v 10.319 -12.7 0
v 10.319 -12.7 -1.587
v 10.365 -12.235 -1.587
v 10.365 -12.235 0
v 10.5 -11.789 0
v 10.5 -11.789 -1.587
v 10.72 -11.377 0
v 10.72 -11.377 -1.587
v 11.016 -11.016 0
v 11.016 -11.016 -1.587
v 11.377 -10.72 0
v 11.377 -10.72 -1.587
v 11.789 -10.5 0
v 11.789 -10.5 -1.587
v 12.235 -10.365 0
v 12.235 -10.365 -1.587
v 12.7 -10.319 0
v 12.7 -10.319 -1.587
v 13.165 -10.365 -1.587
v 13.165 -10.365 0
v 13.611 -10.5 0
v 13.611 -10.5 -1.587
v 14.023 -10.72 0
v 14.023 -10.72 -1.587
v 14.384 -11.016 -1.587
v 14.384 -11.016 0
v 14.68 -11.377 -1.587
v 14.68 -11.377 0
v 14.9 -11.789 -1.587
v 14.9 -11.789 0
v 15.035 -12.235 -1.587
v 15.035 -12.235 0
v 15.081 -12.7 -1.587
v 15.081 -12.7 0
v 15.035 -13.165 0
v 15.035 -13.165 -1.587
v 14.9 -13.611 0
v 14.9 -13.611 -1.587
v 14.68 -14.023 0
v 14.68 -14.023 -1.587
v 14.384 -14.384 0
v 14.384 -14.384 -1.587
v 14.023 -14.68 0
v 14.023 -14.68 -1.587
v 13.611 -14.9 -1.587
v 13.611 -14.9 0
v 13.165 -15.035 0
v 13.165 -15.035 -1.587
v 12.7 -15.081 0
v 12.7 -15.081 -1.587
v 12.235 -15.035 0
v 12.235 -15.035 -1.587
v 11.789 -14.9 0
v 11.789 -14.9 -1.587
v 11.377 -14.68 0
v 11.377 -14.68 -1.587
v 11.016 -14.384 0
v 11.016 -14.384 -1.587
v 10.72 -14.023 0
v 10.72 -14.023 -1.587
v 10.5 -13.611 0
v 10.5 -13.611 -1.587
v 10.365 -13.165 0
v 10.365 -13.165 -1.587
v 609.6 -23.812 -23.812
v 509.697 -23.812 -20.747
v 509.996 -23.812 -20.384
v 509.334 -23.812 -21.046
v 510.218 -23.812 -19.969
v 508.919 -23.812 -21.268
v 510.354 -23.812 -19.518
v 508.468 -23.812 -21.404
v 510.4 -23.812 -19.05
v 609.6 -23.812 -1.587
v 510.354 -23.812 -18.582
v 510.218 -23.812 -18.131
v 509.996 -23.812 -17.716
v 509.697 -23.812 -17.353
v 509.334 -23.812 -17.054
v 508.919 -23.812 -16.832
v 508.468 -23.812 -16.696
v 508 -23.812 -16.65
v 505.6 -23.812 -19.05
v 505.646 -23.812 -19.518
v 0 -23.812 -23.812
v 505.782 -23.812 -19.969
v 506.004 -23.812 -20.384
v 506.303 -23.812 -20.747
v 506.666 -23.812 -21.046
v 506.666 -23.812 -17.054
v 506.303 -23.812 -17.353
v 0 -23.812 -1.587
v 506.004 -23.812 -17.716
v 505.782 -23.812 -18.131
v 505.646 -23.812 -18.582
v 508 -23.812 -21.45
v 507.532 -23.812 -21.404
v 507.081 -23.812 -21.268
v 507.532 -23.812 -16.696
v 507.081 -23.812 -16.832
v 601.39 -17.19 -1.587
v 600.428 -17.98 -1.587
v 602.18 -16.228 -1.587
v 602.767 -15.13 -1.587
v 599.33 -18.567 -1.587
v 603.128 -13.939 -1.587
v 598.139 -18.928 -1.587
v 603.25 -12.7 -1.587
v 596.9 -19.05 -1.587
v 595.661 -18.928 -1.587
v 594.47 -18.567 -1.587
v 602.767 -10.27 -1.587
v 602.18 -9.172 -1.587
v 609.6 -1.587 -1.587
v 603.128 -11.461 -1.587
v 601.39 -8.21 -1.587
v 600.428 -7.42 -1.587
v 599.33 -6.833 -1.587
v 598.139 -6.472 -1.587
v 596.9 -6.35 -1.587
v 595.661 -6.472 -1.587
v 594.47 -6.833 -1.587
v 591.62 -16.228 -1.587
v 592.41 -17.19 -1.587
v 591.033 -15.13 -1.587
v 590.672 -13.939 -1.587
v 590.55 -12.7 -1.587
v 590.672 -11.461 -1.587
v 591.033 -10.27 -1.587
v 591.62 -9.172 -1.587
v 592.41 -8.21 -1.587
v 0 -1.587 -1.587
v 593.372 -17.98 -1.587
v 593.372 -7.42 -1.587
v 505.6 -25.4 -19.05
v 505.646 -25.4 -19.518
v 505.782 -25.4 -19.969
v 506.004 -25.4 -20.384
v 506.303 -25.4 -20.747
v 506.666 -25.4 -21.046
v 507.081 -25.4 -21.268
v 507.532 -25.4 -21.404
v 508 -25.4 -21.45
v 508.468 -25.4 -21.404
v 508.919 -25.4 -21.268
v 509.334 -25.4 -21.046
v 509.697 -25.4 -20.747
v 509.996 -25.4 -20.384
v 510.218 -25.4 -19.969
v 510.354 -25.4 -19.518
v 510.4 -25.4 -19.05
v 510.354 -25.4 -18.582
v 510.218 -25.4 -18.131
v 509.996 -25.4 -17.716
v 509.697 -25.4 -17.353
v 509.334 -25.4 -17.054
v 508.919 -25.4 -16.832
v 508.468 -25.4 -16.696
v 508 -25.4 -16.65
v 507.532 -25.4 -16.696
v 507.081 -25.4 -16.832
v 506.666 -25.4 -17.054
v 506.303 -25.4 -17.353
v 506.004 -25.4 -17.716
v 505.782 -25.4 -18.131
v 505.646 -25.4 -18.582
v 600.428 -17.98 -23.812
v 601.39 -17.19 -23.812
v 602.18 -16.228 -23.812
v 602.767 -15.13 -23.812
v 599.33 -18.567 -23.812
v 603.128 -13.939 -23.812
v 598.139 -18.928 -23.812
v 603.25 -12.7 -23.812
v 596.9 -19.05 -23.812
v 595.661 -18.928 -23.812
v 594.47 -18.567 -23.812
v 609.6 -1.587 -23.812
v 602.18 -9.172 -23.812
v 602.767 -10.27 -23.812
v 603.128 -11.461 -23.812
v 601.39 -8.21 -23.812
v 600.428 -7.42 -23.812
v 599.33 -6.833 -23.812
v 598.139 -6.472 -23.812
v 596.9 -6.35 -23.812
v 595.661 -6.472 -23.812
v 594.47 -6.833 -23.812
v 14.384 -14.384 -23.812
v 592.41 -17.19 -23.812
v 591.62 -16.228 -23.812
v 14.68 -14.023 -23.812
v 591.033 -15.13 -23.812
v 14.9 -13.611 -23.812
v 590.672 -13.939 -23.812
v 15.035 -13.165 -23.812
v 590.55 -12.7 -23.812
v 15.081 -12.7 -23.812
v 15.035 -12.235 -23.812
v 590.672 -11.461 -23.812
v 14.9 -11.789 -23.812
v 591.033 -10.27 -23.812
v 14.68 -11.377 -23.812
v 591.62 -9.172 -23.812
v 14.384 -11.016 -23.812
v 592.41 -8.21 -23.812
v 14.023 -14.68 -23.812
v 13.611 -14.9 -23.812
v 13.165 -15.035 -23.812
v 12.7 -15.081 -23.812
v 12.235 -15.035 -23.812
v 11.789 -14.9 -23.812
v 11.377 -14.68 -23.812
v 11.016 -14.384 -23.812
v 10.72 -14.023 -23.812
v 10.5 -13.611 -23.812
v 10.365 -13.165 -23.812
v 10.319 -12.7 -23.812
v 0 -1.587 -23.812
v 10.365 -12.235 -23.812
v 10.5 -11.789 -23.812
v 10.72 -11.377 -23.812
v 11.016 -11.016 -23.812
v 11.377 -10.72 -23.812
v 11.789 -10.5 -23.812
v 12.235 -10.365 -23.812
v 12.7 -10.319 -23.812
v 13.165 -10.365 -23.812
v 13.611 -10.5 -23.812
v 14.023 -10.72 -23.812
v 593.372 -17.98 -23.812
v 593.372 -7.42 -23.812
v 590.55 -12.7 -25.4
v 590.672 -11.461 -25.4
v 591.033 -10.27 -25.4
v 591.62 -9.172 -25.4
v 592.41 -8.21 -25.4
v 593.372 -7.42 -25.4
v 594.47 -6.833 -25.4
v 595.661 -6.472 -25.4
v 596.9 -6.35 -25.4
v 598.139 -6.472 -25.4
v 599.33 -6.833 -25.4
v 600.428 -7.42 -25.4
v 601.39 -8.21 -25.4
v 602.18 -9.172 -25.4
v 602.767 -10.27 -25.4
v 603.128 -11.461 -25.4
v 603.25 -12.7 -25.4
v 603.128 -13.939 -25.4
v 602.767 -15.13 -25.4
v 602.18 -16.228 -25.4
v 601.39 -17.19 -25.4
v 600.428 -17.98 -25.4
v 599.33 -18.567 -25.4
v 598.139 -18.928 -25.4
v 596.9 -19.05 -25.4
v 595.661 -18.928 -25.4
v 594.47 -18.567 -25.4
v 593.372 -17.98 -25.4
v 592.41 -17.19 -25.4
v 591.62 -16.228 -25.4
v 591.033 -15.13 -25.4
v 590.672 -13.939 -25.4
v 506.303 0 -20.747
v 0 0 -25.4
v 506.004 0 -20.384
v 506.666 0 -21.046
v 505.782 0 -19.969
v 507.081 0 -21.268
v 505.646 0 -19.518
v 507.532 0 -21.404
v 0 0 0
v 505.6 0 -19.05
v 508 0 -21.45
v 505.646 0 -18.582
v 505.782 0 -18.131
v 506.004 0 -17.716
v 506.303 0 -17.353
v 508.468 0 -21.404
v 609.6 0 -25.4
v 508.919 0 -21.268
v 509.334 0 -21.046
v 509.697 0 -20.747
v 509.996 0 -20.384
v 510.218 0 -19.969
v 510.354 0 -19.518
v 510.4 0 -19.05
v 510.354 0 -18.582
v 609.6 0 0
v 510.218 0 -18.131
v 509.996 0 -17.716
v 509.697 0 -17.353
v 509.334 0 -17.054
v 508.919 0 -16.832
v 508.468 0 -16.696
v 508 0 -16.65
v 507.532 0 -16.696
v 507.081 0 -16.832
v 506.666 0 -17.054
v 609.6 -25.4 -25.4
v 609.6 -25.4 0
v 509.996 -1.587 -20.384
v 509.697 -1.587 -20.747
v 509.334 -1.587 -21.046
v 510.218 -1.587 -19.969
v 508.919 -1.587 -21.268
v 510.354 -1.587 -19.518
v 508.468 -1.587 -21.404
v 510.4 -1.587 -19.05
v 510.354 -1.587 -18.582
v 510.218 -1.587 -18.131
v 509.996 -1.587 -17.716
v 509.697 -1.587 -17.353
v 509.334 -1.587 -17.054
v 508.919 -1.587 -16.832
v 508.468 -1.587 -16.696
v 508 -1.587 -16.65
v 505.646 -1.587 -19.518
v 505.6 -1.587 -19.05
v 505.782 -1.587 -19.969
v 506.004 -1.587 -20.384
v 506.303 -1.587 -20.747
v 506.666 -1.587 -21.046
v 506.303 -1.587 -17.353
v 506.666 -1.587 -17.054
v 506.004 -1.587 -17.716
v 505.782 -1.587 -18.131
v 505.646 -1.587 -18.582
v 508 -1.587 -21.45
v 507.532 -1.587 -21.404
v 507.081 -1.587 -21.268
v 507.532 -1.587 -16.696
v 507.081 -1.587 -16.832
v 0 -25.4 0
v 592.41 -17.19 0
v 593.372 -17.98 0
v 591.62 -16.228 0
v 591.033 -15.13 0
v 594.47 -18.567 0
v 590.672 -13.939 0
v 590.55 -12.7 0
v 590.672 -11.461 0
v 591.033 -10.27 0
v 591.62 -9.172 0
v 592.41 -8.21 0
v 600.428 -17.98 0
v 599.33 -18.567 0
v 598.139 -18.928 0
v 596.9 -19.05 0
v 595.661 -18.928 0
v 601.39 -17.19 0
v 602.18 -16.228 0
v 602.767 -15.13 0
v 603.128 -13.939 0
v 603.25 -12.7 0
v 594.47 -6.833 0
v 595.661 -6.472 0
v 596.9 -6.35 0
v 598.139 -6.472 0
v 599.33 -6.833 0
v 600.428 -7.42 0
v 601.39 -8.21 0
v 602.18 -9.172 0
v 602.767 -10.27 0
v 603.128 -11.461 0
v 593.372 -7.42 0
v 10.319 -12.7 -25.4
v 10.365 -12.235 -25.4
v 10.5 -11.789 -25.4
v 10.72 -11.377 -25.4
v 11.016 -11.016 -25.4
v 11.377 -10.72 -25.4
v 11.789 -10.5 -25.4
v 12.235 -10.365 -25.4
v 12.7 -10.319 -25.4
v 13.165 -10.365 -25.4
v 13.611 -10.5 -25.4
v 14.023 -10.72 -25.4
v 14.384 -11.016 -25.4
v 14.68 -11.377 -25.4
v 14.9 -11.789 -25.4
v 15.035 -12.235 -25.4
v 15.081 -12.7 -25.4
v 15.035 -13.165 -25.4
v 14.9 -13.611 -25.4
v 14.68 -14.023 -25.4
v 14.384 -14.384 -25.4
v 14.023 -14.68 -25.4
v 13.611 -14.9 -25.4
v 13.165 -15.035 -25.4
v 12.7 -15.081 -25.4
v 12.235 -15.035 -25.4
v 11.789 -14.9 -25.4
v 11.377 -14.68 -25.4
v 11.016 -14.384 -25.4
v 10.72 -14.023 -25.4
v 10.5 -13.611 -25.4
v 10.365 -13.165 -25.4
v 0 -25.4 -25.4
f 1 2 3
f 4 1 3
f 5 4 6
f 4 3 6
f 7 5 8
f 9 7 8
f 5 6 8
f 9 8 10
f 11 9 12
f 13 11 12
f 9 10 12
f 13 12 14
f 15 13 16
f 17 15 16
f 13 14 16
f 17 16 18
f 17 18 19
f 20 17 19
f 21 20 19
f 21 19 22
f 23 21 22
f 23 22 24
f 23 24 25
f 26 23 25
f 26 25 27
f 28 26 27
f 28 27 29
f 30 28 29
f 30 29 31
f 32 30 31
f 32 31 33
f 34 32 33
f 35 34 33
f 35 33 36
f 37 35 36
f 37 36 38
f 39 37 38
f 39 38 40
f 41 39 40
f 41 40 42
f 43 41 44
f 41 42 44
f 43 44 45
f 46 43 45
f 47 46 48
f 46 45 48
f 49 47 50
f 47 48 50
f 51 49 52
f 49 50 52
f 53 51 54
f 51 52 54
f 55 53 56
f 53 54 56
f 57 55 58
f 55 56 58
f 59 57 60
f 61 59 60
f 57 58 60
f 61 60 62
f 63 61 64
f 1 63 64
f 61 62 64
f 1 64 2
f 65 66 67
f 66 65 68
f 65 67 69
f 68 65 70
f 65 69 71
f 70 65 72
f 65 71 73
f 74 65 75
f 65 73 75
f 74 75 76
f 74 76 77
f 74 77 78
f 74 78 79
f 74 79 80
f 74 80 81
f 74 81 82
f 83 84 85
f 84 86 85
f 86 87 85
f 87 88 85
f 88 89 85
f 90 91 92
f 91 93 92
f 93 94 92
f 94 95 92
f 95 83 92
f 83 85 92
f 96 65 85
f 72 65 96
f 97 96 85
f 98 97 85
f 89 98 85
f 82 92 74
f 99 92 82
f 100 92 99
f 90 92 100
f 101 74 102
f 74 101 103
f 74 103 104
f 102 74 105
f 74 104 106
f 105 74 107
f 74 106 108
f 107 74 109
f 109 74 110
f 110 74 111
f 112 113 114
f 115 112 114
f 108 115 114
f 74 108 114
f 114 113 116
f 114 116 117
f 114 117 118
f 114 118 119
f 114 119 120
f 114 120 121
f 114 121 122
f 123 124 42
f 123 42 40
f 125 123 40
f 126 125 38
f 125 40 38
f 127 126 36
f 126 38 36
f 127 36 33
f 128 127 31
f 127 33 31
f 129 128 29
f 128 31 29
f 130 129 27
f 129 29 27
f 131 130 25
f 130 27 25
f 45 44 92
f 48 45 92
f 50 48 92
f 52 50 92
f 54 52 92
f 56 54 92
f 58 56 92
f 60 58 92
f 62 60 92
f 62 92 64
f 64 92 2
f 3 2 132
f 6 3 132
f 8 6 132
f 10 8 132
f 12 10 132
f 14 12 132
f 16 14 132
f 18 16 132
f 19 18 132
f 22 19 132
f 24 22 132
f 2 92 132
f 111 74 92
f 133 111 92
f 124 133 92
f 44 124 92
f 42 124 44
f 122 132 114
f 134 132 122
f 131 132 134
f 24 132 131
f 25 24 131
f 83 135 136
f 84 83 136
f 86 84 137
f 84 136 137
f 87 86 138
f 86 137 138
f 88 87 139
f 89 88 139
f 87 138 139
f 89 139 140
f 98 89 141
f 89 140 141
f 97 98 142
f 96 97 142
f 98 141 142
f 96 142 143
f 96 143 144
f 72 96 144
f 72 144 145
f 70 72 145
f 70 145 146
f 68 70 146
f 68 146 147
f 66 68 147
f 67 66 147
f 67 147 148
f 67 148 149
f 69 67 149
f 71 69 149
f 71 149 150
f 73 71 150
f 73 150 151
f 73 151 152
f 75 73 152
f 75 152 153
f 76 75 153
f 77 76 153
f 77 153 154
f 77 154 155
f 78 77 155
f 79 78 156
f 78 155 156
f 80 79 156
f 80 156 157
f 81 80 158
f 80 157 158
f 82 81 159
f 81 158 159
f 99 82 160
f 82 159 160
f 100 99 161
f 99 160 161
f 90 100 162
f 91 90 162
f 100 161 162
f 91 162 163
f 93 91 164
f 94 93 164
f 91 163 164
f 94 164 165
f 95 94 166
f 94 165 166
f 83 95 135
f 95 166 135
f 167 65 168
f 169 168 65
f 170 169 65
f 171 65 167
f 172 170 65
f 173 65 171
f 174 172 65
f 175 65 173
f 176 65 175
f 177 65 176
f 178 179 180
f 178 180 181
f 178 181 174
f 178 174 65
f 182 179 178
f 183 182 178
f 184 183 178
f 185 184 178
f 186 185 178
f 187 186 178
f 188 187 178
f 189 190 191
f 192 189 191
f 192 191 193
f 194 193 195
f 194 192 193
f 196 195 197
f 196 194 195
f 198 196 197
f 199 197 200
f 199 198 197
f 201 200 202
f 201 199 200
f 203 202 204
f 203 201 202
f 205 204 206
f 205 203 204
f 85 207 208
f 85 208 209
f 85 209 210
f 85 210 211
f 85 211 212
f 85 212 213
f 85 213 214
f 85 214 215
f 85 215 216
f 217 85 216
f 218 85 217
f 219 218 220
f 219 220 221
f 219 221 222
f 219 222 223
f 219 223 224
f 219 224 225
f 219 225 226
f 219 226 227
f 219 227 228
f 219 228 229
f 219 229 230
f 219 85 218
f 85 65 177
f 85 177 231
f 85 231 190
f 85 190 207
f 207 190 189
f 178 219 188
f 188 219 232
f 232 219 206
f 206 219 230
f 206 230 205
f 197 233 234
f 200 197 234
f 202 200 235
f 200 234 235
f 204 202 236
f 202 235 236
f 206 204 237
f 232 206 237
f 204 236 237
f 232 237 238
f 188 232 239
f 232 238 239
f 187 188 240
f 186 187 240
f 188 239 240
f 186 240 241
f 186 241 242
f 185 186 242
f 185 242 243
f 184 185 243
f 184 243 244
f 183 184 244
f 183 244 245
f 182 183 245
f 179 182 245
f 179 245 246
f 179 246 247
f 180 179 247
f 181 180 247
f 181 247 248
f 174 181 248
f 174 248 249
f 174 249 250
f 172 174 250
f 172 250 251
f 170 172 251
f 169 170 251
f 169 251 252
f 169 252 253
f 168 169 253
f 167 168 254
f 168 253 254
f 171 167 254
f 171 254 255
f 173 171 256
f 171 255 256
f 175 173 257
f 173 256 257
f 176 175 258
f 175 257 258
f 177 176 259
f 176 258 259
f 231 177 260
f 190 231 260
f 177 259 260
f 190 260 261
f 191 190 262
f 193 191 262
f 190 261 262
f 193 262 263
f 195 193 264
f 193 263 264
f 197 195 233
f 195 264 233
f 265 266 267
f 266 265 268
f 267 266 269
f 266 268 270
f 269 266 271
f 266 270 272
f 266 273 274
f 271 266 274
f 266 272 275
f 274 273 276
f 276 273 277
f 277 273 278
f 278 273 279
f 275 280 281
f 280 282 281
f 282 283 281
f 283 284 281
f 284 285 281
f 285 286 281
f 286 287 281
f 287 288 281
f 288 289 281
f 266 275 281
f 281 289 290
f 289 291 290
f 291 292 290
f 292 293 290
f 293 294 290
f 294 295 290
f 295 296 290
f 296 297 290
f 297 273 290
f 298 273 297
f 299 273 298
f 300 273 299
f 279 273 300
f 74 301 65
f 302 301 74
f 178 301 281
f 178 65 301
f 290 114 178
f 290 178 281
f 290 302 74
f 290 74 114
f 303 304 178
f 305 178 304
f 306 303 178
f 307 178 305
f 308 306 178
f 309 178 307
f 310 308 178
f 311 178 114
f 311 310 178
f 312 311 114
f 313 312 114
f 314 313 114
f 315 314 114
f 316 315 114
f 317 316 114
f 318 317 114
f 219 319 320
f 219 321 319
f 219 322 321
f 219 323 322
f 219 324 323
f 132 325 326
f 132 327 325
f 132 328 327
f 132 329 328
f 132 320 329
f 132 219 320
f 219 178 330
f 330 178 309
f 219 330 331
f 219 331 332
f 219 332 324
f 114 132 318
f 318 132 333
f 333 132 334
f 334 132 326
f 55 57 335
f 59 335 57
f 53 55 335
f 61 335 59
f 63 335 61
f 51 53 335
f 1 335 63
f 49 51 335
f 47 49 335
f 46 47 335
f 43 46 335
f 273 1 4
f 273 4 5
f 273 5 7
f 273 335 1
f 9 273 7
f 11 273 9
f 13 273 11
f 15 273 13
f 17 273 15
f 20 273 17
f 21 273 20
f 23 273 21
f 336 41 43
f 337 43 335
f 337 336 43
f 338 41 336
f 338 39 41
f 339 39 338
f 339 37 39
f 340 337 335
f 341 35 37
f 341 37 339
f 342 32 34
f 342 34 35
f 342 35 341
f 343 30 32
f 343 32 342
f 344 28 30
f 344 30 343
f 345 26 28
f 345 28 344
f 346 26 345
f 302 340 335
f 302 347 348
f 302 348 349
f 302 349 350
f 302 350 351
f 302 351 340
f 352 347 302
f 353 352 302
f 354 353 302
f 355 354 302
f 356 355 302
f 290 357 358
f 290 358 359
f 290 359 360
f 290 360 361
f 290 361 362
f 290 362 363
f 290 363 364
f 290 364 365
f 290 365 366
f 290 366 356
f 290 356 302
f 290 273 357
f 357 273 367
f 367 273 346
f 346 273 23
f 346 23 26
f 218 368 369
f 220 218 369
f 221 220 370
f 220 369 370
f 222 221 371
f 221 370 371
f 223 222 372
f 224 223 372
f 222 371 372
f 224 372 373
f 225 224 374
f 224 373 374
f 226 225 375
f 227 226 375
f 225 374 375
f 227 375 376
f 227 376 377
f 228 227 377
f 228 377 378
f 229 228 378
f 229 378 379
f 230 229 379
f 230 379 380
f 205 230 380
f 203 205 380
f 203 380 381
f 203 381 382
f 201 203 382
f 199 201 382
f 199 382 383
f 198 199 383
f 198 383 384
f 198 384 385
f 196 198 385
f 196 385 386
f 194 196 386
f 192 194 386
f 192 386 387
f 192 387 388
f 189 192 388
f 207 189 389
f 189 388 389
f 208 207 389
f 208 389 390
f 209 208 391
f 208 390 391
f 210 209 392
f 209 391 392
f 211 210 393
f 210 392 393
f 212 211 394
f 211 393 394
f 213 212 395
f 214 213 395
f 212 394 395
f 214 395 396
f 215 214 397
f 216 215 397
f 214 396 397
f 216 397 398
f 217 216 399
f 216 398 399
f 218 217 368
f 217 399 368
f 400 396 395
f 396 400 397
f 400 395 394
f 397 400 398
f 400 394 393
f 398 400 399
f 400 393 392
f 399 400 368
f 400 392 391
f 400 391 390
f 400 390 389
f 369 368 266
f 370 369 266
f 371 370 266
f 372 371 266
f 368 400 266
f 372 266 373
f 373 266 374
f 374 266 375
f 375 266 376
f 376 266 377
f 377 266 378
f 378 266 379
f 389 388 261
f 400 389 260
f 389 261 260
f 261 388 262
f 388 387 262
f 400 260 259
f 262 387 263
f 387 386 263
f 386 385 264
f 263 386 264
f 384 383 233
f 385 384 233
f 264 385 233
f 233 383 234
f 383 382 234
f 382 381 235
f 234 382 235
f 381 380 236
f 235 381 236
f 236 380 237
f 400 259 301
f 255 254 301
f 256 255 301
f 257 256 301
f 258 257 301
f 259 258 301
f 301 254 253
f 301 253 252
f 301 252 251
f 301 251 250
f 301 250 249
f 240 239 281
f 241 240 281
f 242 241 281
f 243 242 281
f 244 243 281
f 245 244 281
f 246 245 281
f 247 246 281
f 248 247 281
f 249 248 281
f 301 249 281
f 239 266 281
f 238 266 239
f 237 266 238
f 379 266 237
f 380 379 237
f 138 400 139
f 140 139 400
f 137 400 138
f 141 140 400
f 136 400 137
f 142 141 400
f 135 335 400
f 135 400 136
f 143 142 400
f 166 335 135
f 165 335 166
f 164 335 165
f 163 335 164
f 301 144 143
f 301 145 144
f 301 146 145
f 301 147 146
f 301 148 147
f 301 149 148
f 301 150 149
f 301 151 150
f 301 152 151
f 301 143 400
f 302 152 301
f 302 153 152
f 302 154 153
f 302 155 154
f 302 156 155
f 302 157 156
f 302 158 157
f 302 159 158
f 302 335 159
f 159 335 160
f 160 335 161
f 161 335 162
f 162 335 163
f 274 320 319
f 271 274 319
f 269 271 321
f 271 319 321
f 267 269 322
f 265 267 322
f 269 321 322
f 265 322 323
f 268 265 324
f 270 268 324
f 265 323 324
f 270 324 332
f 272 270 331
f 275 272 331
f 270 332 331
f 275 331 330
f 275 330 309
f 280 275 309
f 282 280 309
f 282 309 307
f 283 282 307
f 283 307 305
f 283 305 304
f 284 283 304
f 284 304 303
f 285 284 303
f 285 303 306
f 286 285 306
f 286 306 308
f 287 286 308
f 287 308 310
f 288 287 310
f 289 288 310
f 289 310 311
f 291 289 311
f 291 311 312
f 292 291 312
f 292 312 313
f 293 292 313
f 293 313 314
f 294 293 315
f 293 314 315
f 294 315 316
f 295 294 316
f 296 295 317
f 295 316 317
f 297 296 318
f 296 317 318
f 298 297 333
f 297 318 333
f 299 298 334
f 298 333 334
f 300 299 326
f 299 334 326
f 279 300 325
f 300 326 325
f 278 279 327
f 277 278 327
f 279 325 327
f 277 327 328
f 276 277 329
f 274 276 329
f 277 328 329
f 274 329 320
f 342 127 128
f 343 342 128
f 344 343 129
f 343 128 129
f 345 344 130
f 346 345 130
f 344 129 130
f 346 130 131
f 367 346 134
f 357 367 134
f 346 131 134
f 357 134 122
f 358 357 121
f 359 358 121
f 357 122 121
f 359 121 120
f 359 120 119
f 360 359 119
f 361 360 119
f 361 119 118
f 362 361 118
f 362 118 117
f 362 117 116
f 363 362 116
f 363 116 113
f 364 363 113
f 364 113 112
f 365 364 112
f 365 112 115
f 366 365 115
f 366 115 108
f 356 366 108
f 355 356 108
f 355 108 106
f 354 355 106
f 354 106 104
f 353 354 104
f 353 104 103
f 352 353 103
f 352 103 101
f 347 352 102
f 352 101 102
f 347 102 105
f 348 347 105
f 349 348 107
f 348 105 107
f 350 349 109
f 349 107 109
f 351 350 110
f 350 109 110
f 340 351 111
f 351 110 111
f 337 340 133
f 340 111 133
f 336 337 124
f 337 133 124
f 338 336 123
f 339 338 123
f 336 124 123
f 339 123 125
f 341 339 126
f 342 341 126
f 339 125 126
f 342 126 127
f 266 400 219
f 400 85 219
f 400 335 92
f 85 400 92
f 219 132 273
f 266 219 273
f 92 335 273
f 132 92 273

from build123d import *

# Parameters (mm, degrees)
SKETCH1_W                = 609.6
SKETCH1_H                = 25.4
BOSS_EXTRUDE1_DEPTH      = 25.4
SKETCH2_W                = 22.225
SKETCH2_H                = 22.225
CUT_EXTRUDE1_DEPTH       = 611.657416233
HOLE1_D                  = 4.8006
HOLE1_DEPTH              = 1.5875
M4_CLEARANCE_HOLE1_D     = 4.7625
M4_CLEARANCE_HOLE1_DEPTH = 1.5875
HOLE2_D                  = 12.7
HOLE2_DEPTH              = 1.5875
M4_CLEARANCE_HOLE2_D     = 4.7625
M4_CLEARANCE_HOLE2_DEPTH = 25.4
HOLE3_D                  = 12.7
HOLE3_DEPTH              = 25.4
HOLE4_D                  = 4.8006
HOLE4_DEPTH              = 25.4


with BuildPart() as part:
    # Sketch1 → Boss-Extrude1 (new body)
    with BuildSketch(Plane.XY):
        with Locations((304.8, -12.7)):
            Rectangle(SKETCH1_W, SKETCH1_H)
    extrude(amount=-BOSS_EXTRUDE1_DEPTH)

    # Sketch2 → Cut-Extrude1 (cut, through all)
    with BuildSketch(Plane.ZY):
        with Locations((-12.7, -12.7)):
            Rectangle(SKETCH2_W, SKETCH2_H)
    extrude(amount=-CUT_EXTRUDE1_DEPTH, mode=Mode.SUBTRACT)

    # Hole1
    with Locations(Plane(origin=(0, -23.8125, 0), x_dir=(1, 0, 0), z_dir=(0, 1, 0))):
        with Locations((508, 19.05)):
            Hole(HOLE1_D / 2, depth=HOLE1_DEPTH)

    # M4 Clearance Hole1
    with Locations(Plane.XY.offset(-23.8125)):
        with Locations((12.7, -12.7)):
            Hole(M4_CLEARANCE_HOLE1_D / 2, depth=M4_CLEARANCE_HOLE1_DEPTH)

    # Hole2
    with Locations(Plane.XY.offset(-23.8125)):
        with Locations((596.9, -12.7)):
            Hole(HOLE2_D / 2, depth=HOLE2_DEPTH)

    # M4 Clearance Hole2
    with Locations(Plane.XY):
        with Locations((12.7, -12.7)):
            Hole(M4_CLEARANCE_HOLE2_D / 2, depth=M4_CLEARANCE_HOLE2_DEPTH)

    # Hole3
    with Locations(Plane.XY):
        with Locations((596.9, -12.7)):
            Hole(HOLE3_D / 2, depth=HOLE3_DEPTH)

    # Hole4
    with Locations(Plane(origin=(0, 0, 0), x_dir=(1, 0, 0), z_dir=(0, 1, 0))):
        with Locations((508, 19.05)):
            Hole(HOLE4_D / 2, depth=HOLE4_DEPTH)


solid = part.part
